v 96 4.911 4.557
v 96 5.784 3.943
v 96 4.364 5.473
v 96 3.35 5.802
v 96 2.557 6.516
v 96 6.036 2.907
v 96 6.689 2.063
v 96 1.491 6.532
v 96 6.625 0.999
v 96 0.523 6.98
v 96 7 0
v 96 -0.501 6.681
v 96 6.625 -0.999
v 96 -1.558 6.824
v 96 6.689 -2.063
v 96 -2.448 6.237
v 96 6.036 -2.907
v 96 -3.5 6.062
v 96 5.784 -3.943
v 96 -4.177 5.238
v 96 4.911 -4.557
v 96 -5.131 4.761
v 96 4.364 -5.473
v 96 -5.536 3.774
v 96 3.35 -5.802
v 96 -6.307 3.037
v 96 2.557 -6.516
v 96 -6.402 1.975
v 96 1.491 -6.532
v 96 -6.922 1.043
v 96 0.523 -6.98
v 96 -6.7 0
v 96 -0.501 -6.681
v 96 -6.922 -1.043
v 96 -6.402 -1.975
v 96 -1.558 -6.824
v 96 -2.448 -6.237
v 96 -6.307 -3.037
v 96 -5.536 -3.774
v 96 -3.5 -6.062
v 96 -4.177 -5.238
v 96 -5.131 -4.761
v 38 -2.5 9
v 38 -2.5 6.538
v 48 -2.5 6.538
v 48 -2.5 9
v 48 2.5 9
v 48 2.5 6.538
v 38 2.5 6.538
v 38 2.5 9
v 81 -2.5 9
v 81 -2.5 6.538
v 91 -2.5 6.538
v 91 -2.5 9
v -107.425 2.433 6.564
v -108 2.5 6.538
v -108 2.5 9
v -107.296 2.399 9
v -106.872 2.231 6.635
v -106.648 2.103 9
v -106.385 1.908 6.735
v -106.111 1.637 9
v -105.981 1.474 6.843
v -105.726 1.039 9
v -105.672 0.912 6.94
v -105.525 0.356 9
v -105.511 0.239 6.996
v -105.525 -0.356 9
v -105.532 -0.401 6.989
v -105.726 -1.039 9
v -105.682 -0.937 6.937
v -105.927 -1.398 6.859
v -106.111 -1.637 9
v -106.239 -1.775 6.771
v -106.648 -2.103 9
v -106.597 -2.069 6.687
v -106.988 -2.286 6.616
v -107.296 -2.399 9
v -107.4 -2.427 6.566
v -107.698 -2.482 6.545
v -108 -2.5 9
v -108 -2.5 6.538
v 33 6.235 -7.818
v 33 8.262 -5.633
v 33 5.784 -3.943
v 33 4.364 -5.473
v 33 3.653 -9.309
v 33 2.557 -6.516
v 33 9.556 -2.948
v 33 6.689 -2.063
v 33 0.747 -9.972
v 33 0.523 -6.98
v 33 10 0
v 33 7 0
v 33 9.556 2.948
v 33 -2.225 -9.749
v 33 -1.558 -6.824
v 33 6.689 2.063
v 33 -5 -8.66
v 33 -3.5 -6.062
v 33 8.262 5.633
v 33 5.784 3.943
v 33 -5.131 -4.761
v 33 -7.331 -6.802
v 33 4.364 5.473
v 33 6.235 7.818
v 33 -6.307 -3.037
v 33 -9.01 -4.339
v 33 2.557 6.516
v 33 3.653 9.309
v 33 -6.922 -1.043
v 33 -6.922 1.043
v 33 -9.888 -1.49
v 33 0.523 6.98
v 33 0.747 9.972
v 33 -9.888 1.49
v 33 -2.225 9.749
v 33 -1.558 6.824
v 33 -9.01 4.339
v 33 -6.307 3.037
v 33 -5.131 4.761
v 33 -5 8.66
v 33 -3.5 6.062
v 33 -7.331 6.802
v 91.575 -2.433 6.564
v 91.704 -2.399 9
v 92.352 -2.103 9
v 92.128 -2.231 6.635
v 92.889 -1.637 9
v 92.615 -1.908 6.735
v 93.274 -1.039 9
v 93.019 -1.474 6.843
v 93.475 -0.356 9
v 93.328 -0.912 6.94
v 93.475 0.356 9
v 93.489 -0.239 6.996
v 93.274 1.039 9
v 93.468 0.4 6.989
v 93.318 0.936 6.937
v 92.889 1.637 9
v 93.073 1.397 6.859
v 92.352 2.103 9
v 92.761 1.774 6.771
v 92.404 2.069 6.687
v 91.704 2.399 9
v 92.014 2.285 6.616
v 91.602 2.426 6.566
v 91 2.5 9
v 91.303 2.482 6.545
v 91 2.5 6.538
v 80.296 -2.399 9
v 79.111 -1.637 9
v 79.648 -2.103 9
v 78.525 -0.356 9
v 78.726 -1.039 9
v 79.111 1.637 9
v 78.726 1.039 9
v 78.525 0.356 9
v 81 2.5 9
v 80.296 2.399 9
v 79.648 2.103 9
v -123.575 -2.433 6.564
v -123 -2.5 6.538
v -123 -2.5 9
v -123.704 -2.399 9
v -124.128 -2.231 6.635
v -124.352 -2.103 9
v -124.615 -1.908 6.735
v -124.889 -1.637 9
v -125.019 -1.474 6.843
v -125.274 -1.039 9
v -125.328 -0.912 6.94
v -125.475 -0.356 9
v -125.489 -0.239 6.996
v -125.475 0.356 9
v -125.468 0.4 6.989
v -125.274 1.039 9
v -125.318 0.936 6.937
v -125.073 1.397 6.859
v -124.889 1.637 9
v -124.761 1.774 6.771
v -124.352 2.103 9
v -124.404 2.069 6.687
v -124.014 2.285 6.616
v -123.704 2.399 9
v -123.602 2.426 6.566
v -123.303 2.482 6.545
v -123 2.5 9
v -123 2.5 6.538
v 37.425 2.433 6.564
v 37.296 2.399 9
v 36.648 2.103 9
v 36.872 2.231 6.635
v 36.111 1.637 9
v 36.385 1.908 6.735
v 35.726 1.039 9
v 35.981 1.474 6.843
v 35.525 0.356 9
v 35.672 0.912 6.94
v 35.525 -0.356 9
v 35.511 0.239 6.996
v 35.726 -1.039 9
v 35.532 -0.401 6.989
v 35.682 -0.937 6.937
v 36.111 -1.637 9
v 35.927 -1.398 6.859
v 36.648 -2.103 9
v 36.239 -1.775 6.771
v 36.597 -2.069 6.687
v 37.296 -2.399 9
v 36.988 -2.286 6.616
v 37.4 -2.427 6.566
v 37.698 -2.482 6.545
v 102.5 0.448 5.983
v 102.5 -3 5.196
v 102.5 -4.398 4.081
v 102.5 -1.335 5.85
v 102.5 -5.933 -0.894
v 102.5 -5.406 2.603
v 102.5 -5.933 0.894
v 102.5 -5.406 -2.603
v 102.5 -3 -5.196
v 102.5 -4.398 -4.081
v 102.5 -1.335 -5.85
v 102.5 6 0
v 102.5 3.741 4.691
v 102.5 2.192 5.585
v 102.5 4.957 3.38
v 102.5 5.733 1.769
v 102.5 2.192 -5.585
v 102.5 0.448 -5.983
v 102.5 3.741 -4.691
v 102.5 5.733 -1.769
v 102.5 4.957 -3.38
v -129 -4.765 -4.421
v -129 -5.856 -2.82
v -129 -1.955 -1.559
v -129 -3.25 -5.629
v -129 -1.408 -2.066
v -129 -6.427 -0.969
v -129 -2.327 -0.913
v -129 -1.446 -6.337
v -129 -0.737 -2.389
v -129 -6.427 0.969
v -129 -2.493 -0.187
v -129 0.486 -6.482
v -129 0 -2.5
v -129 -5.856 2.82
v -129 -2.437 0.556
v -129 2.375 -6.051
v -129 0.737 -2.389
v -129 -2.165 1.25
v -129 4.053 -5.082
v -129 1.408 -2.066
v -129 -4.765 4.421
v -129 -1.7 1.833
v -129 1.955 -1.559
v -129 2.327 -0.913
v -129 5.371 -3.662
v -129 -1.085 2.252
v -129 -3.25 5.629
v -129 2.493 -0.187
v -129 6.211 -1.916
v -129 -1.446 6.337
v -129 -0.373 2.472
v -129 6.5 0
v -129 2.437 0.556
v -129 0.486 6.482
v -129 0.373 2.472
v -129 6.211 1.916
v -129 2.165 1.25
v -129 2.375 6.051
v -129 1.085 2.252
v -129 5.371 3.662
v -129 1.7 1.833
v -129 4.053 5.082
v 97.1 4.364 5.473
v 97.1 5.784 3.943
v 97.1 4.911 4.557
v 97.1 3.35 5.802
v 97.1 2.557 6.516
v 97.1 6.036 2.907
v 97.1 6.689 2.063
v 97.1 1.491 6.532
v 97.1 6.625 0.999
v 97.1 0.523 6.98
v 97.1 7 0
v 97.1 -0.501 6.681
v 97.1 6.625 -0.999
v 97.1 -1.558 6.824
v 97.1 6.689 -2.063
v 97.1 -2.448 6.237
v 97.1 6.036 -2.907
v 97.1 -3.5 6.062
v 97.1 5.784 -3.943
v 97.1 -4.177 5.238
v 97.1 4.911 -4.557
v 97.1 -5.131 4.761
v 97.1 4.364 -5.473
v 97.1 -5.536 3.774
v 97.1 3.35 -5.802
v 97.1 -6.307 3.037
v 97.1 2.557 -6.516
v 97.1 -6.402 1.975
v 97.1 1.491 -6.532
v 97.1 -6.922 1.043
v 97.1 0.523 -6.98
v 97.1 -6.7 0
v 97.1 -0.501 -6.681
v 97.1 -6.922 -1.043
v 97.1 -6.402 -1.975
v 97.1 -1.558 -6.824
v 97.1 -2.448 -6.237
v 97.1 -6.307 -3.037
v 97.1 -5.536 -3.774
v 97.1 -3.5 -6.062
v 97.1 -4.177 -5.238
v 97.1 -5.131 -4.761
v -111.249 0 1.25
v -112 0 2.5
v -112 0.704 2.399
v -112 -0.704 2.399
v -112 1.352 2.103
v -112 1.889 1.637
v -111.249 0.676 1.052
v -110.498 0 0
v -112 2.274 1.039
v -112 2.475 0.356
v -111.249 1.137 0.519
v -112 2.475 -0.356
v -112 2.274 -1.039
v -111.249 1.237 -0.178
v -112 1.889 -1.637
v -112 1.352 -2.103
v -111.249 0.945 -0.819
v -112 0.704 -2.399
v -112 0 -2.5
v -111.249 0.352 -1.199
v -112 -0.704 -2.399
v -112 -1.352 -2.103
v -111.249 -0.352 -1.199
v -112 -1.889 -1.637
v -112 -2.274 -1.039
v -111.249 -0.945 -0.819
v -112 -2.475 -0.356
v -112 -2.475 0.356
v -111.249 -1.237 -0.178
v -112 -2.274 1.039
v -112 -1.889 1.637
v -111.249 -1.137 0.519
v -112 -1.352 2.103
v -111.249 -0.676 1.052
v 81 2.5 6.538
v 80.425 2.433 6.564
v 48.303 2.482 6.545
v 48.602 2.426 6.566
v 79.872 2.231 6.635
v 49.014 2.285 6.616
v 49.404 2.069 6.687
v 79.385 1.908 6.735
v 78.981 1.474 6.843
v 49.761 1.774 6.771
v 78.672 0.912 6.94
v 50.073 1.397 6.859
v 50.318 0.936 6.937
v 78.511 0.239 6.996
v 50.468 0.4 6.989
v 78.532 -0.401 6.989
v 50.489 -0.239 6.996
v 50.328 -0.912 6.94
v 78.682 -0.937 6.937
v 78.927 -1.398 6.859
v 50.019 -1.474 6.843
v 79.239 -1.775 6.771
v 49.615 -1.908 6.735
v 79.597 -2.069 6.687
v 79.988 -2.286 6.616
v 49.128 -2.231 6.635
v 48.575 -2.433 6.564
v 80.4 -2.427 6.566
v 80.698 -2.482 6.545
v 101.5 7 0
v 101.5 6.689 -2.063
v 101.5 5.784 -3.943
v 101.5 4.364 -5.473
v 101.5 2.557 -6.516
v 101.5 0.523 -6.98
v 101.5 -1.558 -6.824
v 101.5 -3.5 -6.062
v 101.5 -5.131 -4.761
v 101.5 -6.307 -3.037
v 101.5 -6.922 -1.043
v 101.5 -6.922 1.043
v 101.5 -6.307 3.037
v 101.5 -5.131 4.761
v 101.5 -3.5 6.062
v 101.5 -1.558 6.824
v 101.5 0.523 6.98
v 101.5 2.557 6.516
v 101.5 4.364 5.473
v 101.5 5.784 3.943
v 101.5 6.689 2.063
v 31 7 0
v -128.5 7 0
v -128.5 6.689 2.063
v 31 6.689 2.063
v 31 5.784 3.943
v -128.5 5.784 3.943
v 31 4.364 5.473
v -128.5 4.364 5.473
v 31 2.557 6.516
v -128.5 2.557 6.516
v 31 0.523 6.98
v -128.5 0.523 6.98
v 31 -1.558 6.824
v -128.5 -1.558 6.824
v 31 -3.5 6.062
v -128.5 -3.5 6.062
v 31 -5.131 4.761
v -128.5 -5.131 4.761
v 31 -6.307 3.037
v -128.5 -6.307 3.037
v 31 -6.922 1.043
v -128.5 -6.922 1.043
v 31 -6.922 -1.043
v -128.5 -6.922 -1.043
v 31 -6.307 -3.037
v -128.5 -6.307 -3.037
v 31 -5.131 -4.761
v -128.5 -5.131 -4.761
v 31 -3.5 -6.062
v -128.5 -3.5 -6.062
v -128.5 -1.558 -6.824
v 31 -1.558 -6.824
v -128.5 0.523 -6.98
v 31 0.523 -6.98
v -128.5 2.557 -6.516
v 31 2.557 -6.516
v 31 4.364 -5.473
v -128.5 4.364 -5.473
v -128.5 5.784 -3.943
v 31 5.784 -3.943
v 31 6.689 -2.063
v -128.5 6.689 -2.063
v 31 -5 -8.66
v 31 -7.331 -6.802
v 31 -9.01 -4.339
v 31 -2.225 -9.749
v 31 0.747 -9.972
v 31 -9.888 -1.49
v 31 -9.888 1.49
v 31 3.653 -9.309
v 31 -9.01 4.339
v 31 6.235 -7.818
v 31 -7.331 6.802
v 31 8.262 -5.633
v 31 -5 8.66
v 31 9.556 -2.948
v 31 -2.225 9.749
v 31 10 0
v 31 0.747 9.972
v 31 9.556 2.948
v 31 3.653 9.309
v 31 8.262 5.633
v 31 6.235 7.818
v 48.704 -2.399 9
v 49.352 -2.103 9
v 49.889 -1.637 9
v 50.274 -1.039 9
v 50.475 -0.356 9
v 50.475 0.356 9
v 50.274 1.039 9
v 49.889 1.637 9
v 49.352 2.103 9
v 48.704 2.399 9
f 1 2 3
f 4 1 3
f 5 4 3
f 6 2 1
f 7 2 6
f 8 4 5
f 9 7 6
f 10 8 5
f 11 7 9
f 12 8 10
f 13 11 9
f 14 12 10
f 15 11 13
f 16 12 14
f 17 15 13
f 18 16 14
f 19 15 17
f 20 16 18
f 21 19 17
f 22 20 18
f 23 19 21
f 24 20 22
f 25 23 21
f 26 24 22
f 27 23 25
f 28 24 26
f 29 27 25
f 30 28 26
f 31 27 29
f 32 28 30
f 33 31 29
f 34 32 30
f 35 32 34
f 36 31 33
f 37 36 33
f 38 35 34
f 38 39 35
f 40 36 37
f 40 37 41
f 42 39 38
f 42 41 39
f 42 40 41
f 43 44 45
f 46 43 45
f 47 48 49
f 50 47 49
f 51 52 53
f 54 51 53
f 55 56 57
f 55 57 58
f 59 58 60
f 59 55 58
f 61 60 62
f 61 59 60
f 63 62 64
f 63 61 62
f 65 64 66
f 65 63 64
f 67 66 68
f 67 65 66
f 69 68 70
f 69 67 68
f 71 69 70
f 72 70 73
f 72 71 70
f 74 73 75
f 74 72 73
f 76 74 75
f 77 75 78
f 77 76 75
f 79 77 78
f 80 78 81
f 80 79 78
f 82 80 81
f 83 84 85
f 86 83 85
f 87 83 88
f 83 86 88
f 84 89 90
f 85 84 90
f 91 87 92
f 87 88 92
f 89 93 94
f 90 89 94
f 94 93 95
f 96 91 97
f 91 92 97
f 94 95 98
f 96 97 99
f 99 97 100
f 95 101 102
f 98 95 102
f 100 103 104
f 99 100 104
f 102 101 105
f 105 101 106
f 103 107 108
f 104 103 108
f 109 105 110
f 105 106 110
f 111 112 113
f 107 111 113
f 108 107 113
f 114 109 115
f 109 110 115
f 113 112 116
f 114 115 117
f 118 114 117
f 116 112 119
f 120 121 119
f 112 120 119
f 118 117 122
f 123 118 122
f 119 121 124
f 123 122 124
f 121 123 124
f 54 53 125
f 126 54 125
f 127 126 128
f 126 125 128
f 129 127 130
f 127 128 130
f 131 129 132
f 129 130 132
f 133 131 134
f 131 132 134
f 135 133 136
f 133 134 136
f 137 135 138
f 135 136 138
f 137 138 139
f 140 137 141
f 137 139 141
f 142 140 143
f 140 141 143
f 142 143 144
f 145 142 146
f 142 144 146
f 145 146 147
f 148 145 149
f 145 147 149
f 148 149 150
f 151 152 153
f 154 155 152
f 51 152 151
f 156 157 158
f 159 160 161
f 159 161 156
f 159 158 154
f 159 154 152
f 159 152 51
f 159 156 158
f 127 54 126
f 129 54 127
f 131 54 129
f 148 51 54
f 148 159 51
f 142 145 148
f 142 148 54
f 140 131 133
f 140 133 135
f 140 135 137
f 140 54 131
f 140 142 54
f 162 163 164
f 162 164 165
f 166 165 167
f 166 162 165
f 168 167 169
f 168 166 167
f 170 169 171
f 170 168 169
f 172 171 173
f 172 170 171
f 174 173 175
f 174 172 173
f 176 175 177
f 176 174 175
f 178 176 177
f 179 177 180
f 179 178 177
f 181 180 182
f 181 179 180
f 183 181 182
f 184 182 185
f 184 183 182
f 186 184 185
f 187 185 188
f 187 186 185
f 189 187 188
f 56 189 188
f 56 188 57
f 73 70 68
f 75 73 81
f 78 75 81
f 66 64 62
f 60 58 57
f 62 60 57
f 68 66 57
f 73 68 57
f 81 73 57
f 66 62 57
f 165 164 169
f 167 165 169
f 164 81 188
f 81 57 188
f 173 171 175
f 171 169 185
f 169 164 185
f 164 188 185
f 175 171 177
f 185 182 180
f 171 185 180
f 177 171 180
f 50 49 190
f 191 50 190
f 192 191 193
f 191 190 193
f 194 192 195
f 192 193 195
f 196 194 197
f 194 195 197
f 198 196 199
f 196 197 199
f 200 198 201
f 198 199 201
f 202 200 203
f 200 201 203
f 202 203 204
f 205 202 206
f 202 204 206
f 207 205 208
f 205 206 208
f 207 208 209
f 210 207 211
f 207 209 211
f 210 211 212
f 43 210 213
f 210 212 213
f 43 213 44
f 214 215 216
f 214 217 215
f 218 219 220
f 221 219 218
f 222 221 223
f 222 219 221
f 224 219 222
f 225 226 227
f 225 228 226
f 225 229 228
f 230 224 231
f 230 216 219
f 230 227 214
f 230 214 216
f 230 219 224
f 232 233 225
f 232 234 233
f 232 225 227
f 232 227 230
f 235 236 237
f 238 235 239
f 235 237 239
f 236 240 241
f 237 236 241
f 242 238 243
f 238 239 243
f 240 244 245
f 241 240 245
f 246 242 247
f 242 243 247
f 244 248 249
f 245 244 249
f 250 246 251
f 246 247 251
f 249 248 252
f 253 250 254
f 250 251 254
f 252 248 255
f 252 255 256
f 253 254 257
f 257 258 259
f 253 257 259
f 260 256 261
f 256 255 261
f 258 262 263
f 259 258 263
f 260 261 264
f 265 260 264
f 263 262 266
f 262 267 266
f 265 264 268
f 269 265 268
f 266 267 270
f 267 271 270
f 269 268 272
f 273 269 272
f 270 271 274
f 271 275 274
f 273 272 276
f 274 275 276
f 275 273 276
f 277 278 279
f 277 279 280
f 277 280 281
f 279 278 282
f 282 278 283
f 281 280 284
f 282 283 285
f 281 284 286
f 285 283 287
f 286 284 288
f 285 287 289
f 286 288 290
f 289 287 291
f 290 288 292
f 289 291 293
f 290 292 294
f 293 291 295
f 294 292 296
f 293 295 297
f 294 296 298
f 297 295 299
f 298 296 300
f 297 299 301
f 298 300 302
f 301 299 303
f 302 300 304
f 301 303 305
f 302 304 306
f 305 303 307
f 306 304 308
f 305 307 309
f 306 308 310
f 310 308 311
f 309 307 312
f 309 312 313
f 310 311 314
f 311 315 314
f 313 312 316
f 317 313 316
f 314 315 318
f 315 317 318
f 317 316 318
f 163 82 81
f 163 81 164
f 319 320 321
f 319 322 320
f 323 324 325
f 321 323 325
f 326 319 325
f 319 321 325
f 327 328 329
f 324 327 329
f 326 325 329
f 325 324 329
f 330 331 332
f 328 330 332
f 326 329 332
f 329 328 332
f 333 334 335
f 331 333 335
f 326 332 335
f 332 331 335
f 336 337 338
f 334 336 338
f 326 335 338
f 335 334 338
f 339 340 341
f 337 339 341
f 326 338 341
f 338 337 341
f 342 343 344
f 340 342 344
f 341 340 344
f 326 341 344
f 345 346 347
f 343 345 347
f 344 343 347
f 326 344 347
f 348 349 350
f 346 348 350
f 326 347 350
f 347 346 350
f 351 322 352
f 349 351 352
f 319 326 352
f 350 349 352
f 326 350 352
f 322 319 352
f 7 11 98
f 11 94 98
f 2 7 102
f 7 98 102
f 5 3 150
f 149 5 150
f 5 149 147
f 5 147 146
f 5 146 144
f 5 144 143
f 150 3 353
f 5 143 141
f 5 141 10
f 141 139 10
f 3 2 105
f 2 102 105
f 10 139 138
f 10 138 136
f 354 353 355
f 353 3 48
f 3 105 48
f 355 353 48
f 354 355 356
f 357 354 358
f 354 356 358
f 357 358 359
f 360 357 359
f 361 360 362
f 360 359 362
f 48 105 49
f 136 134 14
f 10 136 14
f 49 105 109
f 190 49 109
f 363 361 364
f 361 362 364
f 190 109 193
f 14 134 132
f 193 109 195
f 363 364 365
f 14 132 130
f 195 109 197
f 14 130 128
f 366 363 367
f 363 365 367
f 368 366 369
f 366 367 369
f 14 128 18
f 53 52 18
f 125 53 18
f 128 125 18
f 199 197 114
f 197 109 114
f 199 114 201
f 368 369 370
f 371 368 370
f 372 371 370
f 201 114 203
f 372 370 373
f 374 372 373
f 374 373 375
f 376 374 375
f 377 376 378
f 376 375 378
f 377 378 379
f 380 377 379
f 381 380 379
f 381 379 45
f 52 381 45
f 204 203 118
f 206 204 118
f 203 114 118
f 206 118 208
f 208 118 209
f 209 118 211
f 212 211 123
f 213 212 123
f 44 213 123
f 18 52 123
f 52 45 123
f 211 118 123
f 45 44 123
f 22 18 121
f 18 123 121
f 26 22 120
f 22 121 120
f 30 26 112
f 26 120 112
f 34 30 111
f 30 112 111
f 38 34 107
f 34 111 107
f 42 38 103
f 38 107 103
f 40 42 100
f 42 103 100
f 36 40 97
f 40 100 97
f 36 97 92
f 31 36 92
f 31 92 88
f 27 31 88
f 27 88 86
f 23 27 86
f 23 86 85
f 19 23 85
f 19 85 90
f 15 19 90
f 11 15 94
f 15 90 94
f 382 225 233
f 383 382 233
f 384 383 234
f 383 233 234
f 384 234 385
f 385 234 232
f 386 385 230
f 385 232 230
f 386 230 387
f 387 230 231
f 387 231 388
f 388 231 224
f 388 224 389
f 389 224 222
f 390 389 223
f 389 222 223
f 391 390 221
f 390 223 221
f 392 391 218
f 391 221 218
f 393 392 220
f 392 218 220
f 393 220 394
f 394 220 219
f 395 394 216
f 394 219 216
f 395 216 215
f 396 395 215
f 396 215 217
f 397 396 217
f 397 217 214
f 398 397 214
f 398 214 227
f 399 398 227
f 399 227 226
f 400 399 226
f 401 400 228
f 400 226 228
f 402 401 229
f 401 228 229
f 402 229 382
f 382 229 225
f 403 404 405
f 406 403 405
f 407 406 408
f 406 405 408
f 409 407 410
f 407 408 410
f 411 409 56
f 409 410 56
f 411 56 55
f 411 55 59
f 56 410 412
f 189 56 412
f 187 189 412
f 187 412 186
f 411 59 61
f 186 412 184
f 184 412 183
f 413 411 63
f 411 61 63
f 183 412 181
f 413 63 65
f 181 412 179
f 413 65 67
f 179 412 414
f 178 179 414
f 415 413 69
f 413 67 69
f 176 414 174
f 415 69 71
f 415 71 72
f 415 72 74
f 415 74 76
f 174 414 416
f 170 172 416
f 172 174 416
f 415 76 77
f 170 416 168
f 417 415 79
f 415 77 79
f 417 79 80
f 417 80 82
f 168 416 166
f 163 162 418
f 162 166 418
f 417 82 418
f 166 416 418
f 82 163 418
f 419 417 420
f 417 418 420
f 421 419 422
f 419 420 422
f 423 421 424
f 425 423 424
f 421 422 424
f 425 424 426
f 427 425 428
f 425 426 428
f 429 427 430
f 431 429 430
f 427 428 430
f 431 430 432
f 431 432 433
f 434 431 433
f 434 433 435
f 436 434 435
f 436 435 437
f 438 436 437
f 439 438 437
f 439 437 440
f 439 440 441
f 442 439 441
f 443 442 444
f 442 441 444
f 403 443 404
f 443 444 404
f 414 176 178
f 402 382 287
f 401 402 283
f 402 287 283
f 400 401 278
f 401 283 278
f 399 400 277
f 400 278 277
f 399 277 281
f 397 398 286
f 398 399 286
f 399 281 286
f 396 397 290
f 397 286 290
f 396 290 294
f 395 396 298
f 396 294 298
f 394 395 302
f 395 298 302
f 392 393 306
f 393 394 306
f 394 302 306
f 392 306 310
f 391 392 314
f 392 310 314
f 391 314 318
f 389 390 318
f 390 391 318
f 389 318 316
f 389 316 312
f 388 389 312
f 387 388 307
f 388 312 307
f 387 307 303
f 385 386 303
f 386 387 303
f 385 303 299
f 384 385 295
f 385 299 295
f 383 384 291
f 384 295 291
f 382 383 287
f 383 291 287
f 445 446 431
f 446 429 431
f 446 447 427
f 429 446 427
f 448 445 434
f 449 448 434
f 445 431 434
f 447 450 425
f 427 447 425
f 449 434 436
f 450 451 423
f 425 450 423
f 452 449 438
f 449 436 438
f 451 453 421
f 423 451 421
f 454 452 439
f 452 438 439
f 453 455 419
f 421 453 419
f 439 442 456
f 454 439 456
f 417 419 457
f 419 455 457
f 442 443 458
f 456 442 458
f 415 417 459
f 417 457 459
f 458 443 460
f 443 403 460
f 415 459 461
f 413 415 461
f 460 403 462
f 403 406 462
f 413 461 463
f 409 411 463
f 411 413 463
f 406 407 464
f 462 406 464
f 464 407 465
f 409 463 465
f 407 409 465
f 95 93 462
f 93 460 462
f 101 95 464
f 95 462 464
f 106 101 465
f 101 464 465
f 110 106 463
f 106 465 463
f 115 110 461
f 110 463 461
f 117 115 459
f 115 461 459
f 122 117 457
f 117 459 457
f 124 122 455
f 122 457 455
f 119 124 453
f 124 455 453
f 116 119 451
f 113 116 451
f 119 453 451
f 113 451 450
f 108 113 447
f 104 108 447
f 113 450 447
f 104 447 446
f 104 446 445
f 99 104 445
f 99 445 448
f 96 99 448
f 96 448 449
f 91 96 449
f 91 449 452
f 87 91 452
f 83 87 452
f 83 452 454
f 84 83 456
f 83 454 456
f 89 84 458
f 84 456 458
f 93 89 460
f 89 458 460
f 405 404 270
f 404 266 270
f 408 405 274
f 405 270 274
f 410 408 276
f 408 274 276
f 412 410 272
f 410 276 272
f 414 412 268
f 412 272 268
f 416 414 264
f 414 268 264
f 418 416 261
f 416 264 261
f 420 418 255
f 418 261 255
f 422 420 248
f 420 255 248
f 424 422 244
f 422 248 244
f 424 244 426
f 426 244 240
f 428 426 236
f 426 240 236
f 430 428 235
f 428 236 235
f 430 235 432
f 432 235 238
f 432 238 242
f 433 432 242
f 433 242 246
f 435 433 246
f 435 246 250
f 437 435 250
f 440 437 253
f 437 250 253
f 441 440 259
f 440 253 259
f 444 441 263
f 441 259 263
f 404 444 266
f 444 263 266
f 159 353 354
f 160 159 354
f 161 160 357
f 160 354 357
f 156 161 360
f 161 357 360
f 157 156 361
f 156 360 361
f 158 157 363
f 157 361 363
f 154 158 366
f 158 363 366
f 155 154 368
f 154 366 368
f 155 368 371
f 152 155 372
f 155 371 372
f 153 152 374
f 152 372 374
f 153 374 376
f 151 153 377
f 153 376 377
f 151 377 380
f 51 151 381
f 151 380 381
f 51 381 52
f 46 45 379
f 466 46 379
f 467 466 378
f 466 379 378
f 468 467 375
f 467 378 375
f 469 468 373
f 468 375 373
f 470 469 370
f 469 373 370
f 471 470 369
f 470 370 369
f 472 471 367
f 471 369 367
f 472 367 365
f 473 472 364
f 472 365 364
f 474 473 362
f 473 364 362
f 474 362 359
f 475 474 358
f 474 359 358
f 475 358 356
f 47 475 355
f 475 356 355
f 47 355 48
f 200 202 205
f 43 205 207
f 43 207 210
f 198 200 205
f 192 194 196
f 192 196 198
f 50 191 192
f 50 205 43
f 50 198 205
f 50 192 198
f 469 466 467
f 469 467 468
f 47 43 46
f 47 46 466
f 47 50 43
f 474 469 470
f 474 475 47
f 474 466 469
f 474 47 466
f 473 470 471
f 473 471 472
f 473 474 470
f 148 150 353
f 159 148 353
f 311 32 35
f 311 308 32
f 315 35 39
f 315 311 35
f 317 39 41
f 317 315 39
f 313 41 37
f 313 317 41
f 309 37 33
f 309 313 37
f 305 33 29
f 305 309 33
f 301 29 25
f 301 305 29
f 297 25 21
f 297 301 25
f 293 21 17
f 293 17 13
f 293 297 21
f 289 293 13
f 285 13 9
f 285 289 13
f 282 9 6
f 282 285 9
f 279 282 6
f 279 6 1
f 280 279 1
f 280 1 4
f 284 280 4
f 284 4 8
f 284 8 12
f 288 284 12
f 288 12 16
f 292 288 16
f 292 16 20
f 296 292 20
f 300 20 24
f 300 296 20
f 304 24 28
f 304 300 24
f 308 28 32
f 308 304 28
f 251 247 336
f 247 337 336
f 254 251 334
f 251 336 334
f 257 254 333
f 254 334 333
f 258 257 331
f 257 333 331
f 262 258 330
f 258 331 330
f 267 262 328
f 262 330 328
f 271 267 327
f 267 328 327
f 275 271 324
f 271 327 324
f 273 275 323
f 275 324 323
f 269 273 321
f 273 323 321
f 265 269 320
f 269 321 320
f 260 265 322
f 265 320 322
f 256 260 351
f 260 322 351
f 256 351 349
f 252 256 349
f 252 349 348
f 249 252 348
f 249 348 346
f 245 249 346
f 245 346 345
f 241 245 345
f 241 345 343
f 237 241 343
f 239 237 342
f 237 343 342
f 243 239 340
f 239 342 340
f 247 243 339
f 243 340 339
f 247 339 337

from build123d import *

# Parameters (mm, degrees)
EXTRUDE_1_DEPTH        = 9
SKETCH_3_R             = 15
CUT_EXTRUDE_1_DEPTH    = 26.5
HOLE_WIZARD_M6_1_D     = 5
HOLE_WIZARD_M6_1_DEPTH = 17
HOLE_WIZARD_M6_1_TIP   = 1.502151548
CHAMFER_1_SIZE         = 1
SKETCH_6_W             = 1.1
SKETCH_6_H             = 0.3


with BuildPart() as part:
    # 草图1 → 旋转1 (revolve)
    with BuildSketch(Plane.XY):
        Polygon((-129, 0), (129, 0), (129, 6), (128, 7), (33, 7), (33, 10), (31, 10), (31, 7), (-128.5, 7), (-129, 6.5), align=None)
    revolve(axis=Axis((-129, 0, 0), (1, 0, 0)))

    # 草图2 → 凸台-拉伸1 (add)
    with BuildSketch(Plane.XY):
        with BuildLine():
            ThreePointArc((-108, 2.5), (-105.5, 0), (-108, -2.5))
            Line((-108, -2.5), (-123, -2.5))
            ThreePointArc((-123, -2.5), (-125.5, 0), (-123, 2.5))
            Line((-123, 2.5), (-108, 2.5))
        make_face()
        with BuildLine():
            Line((38, -2.5), (48, -2.5))
            ThreePointArc((48, -2.5), (50.5, 0), (48, 2.5))
            Line((48, 2.5), (38, 2.5))
            ThreePointArc((38, 2.5), (35.5, 0), (38, -2.5))
        make_face()
        with BuildLine():
            Line((123, 2.5), (108, 2.5))
            ThreePointArc((108, 2.5), (105.5, 0), (108, -2.5))
            Line((108, -2.5), (123, -2.5))
            ThreePointArc((123, -2.5), (125.5, 0), (123, 2.5))
        make_face()
        with BuildLine():
            Line((81, -2.5), (91, -2.5))
            ThreePointArc((91, -2.5), (93.5, 0), (91, 2.5))
            Line((91, 2.5), (81, 2.5))
            ThreePointArc((81, 2.5), (78.5, 0), (81, -2.5))
        make_face()
    extrude(amount=EXTRUDE_1_DEPTH)

    # 草图3 → 切除-拉伸1 (cut)
    with BuildSketch(Plane(origin=(129, 0, 0), x_dir=(0, 0, -1), z_dir=(1, 0, 0))):
        Circle(SKETCH_3_R)
    extrude(amount=-CUT_EXTRUDE_1_DEPTH, mode=Mode.SUBTRACT)

    # M6 螺纹孔1
    with Locations(Plane.ZY.offset(129)):
        with Locations((0, 0)):
            Hole(HOLE_WIZARD_M6_1_D / 2, depth=HOLE_WIZARD_M6_1_DEPTH)
            with Locations((0, 0, -(HOLE_WIZARD_M6_1_DEPTH + HOLE_WIZARD_M6_1_TIP / 2))):  # 118° drill point
                Cone(0, HOLE_WIZARD_M6_1_D / 2, HOLE_WIZARD_M6_1_TIP, mode=Mode.SUBTRACT)

    # 倒角1
    chamfer_1_edges = [part.edges().sort_by_distance(p)[0] for p in [
        (102.5, -7, 0),
    ]]
    chamfer(chamfer_1_edges, length=CHAMFER_1_SIZE)

    # 草图6 → 切除-旋转1 (revolve, cut)
    with BuildSketch(Plane.XY):
        with Locations((96.55, -6.85)):
            Rectangle(SKETCH_6_W, SKETCH_6_H)
    revolve(axis=Axis((0, 0, 0), (1, 0, 0)), mode=Mode.SUBTRACT)


solid = part.part
